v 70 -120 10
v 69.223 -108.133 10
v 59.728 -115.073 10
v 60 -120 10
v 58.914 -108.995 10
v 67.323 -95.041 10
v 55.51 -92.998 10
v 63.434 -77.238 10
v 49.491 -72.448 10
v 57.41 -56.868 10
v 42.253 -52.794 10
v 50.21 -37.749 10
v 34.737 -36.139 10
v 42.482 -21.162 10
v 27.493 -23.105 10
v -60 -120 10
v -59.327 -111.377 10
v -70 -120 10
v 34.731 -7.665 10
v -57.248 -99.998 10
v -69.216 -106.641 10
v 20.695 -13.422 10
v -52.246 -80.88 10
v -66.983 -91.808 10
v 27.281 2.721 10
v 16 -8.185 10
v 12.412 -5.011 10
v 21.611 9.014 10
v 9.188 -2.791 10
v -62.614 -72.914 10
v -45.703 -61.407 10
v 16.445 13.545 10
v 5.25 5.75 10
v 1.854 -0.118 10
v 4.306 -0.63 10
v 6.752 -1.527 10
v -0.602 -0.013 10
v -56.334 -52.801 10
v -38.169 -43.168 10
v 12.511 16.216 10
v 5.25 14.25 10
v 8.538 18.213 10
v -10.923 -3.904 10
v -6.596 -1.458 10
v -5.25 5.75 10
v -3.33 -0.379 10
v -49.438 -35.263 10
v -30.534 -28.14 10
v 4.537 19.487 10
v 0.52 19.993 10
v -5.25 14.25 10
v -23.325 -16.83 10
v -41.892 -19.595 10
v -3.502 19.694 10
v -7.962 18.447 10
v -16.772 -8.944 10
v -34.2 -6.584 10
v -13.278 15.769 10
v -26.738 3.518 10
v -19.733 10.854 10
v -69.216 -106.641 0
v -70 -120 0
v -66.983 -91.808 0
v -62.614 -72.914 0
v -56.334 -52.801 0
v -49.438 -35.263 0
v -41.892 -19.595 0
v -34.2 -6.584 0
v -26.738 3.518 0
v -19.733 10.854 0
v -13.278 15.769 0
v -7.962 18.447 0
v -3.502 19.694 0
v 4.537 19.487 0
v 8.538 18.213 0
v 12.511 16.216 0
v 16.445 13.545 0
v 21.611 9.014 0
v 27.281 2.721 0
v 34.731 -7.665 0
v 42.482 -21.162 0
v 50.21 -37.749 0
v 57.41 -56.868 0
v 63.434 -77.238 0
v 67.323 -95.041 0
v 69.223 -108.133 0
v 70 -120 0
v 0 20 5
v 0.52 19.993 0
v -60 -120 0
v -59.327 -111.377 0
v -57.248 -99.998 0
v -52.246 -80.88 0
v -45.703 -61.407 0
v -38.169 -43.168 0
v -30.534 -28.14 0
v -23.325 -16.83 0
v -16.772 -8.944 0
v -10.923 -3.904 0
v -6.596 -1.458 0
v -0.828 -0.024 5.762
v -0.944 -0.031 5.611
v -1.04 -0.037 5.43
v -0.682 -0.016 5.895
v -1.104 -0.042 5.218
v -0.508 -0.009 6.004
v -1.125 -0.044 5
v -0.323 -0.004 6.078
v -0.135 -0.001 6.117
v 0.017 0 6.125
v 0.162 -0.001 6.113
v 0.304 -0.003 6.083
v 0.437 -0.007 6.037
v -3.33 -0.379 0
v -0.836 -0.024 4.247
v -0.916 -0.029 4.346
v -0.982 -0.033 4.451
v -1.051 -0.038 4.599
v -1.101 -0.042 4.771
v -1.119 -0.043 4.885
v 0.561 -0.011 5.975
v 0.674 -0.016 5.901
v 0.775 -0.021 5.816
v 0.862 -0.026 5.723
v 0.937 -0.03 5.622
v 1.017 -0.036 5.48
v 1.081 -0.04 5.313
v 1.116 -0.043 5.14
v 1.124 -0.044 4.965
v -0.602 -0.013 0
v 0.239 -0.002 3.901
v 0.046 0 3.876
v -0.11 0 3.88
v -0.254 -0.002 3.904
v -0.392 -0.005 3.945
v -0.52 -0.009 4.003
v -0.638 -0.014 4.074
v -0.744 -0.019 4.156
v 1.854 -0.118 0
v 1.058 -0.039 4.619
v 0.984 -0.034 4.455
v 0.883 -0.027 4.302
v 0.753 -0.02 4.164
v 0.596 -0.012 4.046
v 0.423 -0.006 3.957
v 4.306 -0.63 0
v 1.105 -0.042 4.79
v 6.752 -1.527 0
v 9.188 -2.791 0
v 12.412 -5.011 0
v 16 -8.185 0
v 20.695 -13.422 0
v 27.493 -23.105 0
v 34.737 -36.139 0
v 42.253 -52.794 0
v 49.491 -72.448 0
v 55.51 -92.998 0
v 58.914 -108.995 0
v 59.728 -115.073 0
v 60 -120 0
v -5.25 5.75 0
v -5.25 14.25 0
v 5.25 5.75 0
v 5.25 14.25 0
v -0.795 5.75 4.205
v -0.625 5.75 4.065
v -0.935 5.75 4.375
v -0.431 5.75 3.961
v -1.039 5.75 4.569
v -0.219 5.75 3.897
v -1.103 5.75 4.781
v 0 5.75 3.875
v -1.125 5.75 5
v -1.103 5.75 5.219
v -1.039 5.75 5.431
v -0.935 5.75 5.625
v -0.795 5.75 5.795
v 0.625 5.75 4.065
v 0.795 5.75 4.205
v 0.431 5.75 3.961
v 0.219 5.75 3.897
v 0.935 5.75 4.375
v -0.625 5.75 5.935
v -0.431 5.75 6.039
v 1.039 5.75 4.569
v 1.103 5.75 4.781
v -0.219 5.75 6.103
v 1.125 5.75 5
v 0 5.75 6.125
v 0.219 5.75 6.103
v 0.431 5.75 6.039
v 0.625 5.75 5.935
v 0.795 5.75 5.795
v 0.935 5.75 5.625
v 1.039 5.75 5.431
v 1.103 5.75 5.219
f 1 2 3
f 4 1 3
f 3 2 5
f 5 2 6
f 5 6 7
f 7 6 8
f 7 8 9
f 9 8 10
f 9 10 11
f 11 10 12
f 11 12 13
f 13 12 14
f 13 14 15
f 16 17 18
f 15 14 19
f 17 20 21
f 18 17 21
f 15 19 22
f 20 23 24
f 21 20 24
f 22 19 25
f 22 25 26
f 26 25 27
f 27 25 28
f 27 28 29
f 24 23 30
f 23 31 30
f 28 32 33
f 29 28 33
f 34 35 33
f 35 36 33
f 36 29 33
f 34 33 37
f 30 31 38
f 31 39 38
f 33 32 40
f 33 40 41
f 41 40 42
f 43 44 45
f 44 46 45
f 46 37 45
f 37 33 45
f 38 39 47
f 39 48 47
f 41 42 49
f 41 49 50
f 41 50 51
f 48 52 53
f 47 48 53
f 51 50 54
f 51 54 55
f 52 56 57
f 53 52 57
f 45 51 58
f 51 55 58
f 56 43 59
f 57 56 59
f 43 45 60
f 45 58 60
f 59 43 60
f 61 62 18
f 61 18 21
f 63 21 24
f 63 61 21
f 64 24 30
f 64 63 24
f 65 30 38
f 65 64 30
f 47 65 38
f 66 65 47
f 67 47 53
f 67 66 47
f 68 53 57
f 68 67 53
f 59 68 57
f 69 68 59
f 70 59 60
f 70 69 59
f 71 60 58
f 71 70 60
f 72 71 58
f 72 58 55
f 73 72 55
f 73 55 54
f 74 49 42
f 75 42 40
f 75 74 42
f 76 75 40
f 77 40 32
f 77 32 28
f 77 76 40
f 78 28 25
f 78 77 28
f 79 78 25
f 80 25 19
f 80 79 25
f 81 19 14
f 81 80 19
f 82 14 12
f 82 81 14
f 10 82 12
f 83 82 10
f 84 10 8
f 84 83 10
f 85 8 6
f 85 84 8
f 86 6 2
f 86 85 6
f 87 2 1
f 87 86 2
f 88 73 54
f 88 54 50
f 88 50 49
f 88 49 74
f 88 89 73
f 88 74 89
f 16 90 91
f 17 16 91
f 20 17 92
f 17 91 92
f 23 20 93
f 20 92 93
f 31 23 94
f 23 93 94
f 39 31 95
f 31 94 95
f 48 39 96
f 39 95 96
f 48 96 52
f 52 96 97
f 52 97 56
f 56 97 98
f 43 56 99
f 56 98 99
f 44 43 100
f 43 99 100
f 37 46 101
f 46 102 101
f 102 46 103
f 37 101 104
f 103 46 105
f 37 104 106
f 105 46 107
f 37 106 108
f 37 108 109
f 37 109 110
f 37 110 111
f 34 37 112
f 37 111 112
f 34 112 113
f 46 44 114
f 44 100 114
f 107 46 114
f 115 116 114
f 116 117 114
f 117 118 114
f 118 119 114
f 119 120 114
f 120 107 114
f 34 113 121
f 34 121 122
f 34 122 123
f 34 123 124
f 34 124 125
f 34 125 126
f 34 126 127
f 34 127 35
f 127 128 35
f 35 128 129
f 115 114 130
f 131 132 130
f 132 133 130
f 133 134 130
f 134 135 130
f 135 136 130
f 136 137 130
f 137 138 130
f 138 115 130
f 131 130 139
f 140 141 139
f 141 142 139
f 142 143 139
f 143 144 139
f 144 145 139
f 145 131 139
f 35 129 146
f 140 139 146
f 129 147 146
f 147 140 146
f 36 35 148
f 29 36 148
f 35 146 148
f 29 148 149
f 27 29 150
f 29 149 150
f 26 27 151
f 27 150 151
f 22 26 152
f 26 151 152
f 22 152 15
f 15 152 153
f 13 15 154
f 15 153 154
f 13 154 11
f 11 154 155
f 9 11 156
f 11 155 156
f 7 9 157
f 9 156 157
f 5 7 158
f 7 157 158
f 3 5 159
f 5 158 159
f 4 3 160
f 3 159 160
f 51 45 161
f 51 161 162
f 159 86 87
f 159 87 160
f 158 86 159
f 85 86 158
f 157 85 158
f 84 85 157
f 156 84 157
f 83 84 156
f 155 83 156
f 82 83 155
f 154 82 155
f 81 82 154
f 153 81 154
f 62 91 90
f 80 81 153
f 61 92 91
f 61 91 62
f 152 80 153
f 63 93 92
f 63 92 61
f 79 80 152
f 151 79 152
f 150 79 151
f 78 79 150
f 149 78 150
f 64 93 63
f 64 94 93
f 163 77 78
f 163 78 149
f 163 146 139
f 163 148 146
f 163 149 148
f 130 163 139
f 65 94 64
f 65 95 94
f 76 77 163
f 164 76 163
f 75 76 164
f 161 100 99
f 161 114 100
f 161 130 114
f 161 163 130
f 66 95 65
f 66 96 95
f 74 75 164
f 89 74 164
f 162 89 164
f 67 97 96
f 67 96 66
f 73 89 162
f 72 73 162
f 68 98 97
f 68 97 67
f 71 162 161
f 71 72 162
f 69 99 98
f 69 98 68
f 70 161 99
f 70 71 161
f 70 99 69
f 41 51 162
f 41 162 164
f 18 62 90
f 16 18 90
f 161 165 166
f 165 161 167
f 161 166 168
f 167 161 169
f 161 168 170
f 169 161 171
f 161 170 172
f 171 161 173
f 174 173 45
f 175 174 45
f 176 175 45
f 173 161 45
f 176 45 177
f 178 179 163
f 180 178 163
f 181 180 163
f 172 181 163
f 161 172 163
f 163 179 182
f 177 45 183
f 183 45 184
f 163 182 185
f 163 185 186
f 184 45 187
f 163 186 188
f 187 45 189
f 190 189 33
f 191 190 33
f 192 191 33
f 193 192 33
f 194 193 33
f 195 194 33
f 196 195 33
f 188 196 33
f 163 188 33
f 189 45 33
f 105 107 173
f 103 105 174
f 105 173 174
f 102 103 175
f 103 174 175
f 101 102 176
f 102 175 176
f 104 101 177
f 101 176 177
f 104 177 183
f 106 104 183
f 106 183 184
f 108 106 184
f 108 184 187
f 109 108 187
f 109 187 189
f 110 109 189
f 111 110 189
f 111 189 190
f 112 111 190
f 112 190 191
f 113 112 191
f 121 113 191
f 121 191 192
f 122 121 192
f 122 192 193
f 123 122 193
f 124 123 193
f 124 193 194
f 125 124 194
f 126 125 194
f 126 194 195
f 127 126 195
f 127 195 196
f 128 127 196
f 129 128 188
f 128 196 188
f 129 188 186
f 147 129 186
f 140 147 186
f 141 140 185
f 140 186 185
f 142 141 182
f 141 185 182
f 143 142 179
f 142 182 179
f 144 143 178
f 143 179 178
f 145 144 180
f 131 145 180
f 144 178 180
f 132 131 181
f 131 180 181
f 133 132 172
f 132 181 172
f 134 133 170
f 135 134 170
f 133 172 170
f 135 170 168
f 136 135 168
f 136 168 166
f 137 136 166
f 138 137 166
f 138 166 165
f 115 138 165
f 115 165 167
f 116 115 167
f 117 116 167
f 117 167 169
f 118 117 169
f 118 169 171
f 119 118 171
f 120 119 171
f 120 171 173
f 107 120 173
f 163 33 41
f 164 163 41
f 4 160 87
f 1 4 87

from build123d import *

# Parameters (mm, degrees)
F1_DEPTH = 10
F2_W     = 10.5
F2_H     = 8.5
F3_DEPTH = 10
F4_R     = 1.125
F5_DEPTH = 5.7948195458


with BuildPart() as f1:
    # F0 (on Top) → F1 (new body)
    with BuildSketch(Plane.XY):
        with BuildLine():
            add(Edge.make_bspline(
                [(-70, -120), (-69.9490740645, -72.2301395677), (0.3708027655, 112.2301395677), (69.2074685334, -72.2301395677), (70, -120)],
                knots=[0, 0, 0, 0, 0.5, 1, 1, 1, 1], degree=3))
            Line((-70, -120), (-60, -120))
            add(Edge.make_bspline(
                [(-60, -120), (-60.2770864151, -94.6751633451), (0.1071934019, 94.6751633451), (60.0626996113, -94.6751633451), (60, -120)],
                knots=[0, 0, 0, 0, 0.5, 1, 1, 1, 1], degree=3))
            Line((60, -120), (70, -120))
        make_face()
    extrude(amount=F1_DEPTH)

    # F2 (on face) → F3 (cut, through all)
    with BuildSketch(Plane.XY.offset(10)):
        with Locations((0, 10)):
            Rectangle(F2_W, F2_H)
    extrude(amount=-F3_DEPTH, mode=Mode.SUBTRACT)

    # F4 (on face) → F5 (cut, through all)
    with BuildSketch(Plane(origin=(0, 5.75, 0), x_dir=(-1, 0, 0), z_dir=(0, 1, 0))):
        with Locations((0, 5)):
            Circle(F4_R)
    extrude(amount=-F5_DEPTH, mode=Mode.SUBTRACT)


solid = f1.part
